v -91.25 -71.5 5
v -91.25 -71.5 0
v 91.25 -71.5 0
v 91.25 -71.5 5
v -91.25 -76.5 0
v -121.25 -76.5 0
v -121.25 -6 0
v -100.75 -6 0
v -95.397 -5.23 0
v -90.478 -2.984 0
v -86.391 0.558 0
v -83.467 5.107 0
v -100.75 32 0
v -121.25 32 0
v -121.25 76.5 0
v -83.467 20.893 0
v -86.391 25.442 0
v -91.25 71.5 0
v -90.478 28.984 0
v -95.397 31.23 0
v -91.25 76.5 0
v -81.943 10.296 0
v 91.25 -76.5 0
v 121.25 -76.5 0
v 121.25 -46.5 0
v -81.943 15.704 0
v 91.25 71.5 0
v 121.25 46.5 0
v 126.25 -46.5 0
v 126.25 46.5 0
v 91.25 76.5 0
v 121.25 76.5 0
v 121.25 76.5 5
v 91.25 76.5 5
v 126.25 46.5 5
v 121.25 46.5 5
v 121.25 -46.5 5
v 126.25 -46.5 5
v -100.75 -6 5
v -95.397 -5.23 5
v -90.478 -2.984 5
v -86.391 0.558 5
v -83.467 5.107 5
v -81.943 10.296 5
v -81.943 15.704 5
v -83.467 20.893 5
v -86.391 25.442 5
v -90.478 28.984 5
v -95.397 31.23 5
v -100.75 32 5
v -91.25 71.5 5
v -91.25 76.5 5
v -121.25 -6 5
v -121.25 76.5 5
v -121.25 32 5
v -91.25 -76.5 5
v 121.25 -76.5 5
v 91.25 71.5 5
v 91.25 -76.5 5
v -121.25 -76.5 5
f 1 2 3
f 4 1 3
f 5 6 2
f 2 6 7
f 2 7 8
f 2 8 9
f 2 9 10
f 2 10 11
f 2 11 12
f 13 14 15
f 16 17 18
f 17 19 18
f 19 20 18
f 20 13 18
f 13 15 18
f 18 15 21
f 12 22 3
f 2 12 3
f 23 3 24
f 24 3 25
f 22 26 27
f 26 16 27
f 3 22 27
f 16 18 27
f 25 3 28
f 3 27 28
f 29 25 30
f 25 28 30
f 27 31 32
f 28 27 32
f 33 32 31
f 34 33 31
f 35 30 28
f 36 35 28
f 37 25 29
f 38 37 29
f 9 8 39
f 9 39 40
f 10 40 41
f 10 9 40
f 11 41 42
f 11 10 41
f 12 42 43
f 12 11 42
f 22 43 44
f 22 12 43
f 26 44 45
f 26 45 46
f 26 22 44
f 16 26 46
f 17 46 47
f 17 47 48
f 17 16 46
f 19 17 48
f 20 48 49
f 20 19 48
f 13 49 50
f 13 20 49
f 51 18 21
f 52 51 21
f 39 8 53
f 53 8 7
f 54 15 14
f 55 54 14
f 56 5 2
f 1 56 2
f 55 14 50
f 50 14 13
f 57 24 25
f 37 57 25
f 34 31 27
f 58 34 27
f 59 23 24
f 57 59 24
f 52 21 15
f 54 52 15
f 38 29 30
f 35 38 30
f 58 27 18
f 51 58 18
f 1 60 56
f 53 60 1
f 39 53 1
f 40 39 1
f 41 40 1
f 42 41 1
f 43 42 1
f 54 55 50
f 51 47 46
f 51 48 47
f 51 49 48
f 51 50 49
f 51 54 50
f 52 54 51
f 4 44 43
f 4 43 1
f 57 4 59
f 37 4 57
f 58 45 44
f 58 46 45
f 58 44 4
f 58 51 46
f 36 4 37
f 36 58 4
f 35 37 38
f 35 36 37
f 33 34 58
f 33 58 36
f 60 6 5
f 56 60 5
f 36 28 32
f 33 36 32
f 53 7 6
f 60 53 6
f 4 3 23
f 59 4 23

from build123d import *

# Parameters (mm, degrees)
PAD_DEPTH = 5


with BuildPart() as part:
    # Sketch → Pad (new body)
    with BuildSketch(Plane.XY):
        with BuildLine():
            Line((121.25, 46.5), (121.25, 76.5))
            Line((121.25, 76.5), (91.25, 76.5))
            Line((91.25, 76.5), (91.25, 71.5))
            Line((91.25, 71.5), (-91.25, 71.5))
            Line((-91.25, 71.5), (-91.25, 76.5))
            Line((-91.25, 76.5), (-121.25, 76.5))
            Line((-121.25, 76.5), (-121.25, 32))
            Line((-121.25, 32), (-100.75, 32))
            ThreePointArc((-100.75, -6), (-81.75, 13), (-100.75, 32))
            Line((-100.75, -6), (-121.25, -6))
            Line((-121.25, -6), (-121.25, -76.5))
            Line((-121.25, -76.5), (-91.25, -76.5))
            Line((-91.25, -76.5), (-91.25, -71.5))
            Line((-91.25, -71.5), (91.25, -71.5))
            Line((91.25, -71.5), (91.25, -76.5))
            Line((91.25, -76.5), (121.25, -76.5))
            Line((121.25, -76.5), (121.25, -46.5))
            Line((121.25, -46.5), (126.25, -46.5))
            Line((126.25, -46.5), (126.25, 46.5))
            Line((126.25, 46.5), (121.25, 46.5))
        make_face()
    extrude(amount=PAD_DEPTH)


solid = part.part
